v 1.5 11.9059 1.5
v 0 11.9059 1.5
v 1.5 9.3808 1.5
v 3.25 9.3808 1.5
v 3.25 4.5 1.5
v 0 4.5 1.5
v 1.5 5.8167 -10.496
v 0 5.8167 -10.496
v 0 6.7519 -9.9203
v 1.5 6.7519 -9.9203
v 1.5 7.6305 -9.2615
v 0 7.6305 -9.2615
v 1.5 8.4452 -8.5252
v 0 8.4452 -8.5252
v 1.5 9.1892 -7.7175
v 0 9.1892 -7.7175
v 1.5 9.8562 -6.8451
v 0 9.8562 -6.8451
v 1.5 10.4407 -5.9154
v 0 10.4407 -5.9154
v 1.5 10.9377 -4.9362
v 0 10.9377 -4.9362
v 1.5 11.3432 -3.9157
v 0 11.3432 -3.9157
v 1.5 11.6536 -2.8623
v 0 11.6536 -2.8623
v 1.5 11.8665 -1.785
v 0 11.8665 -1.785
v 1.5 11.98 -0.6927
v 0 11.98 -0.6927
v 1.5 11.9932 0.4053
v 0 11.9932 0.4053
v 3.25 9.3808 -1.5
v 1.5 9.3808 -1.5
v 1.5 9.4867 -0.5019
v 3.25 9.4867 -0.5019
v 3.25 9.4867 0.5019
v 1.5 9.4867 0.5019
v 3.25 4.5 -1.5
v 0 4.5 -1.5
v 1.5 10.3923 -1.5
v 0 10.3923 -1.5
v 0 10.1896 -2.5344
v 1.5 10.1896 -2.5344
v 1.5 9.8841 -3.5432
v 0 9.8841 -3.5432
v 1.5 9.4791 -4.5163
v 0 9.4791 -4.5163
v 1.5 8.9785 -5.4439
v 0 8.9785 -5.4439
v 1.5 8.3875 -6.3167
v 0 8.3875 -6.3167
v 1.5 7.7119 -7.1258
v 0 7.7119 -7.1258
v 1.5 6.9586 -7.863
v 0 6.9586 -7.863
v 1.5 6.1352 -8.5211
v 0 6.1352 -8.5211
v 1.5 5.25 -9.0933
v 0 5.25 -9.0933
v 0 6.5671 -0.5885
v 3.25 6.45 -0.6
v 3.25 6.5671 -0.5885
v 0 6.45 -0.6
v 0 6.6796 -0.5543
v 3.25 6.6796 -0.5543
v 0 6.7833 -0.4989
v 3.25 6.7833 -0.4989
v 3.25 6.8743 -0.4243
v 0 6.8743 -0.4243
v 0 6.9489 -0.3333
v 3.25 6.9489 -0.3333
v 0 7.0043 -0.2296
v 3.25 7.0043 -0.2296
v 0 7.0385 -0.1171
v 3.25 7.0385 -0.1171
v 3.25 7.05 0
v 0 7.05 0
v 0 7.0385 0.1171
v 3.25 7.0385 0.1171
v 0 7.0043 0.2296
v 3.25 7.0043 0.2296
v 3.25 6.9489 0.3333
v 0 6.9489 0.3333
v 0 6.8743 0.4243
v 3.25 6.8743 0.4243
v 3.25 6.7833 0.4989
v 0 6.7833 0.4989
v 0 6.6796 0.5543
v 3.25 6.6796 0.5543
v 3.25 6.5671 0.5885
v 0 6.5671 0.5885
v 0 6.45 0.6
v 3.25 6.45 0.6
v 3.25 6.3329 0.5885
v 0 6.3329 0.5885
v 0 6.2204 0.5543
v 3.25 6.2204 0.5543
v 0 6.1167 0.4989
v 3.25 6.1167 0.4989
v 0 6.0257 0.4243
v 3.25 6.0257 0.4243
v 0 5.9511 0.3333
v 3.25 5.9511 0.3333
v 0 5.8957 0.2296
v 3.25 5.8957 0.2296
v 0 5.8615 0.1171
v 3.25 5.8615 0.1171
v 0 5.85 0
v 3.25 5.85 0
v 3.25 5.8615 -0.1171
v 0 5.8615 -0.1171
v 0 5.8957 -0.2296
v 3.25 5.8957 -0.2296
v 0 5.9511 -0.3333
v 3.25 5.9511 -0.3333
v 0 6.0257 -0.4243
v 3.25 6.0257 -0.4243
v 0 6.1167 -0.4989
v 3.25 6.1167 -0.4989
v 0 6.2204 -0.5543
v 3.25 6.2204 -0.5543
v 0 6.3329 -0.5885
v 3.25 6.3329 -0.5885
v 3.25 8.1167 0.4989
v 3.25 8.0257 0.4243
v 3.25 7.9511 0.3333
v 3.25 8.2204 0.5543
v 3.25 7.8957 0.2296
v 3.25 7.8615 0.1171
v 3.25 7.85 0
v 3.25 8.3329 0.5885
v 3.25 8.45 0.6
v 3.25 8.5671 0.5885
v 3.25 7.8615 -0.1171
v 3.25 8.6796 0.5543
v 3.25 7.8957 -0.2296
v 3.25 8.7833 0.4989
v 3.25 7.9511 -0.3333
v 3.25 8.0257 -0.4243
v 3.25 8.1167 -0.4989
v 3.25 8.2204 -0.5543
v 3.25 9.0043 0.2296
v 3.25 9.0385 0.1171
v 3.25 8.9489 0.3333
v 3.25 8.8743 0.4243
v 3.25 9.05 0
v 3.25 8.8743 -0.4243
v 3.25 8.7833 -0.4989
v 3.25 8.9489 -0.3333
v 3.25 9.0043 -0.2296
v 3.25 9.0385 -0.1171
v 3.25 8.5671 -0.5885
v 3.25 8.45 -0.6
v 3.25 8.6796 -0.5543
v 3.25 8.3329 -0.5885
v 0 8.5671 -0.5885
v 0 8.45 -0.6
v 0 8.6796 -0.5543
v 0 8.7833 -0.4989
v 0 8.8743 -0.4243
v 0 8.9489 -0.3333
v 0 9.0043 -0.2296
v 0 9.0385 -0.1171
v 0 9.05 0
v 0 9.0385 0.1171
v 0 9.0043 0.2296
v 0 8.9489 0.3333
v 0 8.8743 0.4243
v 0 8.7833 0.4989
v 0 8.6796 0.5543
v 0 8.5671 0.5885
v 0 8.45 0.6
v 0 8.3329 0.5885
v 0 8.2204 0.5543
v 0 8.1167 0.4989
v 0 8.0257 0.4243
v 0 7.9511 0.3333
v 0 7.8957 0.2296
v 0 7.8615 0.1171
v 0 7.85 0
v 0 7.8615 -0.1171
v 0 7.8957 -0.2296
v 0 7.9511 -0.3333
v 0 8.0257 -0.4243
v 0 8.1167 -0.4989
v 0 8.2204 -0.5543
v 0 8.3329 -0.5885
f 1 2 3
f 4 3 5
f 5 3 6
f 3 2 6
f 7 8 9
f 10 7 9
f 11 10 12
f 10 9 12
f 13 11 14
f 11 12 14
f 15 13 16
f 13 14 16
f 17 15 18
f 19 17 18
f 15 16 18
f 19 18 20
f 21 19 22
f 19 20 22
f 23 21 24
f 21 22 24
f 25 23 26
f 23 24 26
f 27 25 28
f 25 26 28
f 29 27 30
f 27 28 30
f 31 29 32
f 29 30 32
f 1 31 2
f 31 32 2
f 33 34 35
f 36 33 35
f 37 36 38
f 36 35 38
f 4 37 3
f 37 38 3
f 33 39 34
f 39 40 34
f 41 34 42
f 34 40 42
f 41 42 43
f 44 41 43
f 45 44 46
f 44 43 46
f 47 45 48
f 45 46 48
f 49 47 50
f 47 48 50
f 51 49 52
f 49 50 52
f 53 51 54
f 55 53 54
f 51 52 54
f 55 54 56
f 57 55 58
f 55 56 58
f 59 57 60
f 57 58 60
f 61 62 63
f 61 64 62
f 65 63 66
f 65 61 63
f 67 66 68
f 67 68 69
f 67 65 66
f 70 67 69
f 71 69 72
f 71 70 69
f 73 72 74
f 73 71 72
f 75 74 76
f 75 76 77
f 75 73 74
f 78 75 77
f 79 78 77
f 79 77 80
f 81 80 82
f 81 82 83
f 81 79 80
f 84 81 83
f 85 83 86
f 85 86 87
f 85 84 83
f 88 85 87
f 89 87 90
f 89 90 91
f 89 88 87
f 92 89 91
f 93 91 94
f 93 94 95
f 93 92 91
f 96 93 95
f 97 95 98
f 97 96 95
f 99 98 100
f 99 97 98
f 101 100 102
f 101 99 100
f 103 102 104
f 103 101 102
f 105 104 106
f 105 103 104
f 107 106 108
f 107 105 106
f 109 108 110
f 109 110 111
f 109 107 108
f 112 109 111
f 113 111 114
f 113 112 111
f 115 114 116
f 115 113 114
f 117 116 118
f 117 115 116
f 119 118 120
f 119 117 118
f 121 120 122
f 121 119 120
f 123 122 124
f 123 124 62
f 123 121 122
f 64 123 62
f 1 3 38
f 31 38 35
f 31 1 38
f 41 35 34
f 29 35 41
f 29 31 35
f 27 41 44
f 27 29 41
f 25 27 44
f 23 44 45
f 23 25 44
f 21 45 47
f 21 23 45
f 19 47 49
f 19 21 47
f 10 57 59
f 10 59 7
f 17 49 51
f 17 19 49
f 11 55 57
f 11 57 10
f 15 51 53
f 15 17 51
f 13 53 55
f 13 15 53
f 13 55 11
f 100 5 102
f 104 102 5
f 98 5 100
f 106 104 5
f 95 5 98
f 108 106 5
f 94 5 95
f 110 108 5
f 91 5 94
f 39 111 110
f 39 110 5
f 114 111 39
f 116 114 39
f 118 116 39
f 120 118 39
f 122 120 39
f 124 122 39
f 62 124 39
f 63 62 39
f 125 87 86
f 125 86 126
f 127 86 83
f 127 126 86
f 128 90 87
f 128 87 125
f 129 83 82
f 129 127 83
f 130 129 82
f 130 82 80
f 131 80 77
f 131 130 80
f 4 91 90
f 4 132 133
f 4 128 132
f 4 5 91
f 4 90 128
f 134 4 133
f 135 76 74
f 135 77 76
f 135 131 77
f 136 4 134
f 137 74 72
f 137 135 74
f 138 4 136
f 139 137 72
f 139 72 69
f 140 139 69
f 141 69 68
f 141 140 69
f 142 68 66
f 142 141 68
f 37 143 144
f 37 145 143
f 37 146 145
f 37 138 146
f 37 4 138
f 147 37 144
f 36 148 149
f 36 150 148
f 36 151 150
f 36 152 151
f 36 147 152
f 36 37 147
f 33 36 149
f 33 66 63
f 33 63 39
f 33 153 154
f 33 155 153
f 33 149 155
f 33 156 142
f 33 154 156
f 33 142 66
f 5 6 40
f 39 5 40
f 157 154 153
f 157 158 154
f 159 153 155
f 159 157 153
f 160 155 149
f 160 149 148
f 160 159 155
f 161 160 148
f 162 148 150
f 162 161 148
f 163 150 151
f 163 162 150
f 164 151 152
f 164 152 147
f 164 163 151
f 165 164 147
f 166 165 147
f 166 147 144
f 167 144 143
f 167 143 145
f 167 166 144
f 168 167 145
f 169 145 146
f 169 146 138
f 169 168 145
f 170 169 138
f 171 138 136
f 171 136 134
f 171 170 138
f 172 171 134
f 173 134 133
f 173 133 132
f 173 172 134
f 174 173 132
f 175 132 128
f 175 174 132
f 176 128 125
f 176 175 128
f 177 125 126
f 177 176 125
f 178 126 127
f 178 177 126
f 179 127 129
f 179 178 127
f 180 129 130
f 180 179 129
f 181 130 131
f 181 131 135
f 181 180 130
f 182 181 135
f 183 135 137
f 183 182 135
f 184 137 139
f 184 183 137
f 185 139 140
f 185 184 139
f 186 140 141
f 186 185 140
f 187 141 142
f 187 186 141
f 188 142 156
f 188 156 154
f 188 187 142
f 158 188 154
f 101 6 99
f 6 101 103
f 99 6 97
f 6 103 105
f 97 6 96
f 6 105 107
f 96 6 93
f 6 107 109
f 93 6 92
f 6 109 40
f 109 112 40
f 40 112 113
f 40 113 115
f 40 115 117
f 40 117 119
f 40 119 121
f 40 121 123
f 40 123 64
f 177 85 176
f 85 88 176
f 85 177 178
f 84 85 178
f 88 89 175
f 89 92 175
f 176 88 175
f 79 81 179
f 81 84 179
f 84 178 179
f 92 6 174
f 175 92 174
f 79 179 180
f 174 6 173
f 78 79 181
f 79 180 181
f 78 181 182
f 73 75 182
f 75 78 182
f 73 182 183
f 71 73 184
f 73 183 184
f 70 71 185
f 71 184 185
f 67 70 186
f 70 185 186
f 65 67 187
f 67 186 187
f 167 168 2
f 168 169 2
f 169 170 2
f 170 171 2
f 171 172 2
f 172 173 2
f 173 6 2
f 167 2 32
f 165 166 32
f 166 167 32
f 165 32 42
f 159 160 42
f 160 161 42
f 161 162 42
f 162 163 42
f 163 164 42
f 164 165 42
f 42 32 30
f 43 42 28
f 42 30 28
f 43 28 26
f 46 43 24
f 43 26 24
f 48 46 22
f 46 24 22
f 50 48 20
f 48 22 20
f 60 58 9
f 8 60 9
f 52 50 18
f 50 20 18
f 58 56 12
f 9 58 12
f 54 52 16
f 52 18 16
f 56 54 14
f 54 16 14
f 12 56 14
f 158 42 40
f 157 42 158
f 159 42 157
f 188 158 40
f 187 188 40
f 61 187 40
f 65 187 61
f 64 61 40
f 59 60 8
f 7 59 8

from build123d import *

# Parameters (mm, degrees)
CROQUIS1_R              = 0.6
SALIENTE_EXTRUIR1_DEPTH = 1.5
CROQUIS2_R              = 0.6
SALIENTE_EXTRUIR2_DEPTH = 1.75


with BuildPart() as part:
    # Croquis1 → Saliente-Extruir1 (new body)
    with BuildSketch(Plane(origin=(0, 0, 0), x_dir=(0, 0, -1), z_dir=(1, 0, 0))):
        with BuildLine():
            Line((-1.5, 4.5), (1.5, 4.5))
            Line((1.5, 4.5), (1.5, 10.392304845))
            ThreePointArc((1.5, 10.392304845), (5.887711766, 8.693954806), (9.09326674, 5.25))
            Line((9.09326674, 5.25), (10.495980844, 5.816733286))
            ThreePointArc((10.495980844, 5.816733286), (5.431514292, 10.700404315), (-1.5, 11.9058809))
            Line((-1.5, 11.9058809), (-1.5, 4.5))
        make_face()
        with Locations((0, 8.45)):
            Circle(CROQUIS1_R, mode=Mode.SUBTRACT)
        with Locations((0, 6.45)):
            Circle(CROQUIS1_R, mode=Mode.SUBTRACT)
    extrude(amount=SALIENTE_EXTRUIR1_DEPTH)

    # Croquis2 → Saliente-Extruir2 (add)
    with BuildSketch(Plane(origin=(1.5, 0, 0), x_dir=(0, 0, -1), z_dir=(1, 0, 0))):
        with BuildLine():
            Line((-1.5, 4.5), (1.5, 4.5))
            Line((1.5, 4.5), (1.5, 9.38083152))
            ThreePointArc((1.5, 9.38083152), (0, 9.5), (-1.5, 9.38083152))
            Line((-1.5, 9.38083152), (-1.5, 4.5))
        make_face()
        with Locations((0, 6.45)):
            Circle(CROQUIS2_R, mode=Mode.SUBTRACT)
        with Locations((0, 8.45)):
            Circle(CROQUIS2_R, mode=Mode.SUBTRACT)
    extrude(amount=SALIENTE_EXTRUIR2_DEPTH)


solid = part.part
